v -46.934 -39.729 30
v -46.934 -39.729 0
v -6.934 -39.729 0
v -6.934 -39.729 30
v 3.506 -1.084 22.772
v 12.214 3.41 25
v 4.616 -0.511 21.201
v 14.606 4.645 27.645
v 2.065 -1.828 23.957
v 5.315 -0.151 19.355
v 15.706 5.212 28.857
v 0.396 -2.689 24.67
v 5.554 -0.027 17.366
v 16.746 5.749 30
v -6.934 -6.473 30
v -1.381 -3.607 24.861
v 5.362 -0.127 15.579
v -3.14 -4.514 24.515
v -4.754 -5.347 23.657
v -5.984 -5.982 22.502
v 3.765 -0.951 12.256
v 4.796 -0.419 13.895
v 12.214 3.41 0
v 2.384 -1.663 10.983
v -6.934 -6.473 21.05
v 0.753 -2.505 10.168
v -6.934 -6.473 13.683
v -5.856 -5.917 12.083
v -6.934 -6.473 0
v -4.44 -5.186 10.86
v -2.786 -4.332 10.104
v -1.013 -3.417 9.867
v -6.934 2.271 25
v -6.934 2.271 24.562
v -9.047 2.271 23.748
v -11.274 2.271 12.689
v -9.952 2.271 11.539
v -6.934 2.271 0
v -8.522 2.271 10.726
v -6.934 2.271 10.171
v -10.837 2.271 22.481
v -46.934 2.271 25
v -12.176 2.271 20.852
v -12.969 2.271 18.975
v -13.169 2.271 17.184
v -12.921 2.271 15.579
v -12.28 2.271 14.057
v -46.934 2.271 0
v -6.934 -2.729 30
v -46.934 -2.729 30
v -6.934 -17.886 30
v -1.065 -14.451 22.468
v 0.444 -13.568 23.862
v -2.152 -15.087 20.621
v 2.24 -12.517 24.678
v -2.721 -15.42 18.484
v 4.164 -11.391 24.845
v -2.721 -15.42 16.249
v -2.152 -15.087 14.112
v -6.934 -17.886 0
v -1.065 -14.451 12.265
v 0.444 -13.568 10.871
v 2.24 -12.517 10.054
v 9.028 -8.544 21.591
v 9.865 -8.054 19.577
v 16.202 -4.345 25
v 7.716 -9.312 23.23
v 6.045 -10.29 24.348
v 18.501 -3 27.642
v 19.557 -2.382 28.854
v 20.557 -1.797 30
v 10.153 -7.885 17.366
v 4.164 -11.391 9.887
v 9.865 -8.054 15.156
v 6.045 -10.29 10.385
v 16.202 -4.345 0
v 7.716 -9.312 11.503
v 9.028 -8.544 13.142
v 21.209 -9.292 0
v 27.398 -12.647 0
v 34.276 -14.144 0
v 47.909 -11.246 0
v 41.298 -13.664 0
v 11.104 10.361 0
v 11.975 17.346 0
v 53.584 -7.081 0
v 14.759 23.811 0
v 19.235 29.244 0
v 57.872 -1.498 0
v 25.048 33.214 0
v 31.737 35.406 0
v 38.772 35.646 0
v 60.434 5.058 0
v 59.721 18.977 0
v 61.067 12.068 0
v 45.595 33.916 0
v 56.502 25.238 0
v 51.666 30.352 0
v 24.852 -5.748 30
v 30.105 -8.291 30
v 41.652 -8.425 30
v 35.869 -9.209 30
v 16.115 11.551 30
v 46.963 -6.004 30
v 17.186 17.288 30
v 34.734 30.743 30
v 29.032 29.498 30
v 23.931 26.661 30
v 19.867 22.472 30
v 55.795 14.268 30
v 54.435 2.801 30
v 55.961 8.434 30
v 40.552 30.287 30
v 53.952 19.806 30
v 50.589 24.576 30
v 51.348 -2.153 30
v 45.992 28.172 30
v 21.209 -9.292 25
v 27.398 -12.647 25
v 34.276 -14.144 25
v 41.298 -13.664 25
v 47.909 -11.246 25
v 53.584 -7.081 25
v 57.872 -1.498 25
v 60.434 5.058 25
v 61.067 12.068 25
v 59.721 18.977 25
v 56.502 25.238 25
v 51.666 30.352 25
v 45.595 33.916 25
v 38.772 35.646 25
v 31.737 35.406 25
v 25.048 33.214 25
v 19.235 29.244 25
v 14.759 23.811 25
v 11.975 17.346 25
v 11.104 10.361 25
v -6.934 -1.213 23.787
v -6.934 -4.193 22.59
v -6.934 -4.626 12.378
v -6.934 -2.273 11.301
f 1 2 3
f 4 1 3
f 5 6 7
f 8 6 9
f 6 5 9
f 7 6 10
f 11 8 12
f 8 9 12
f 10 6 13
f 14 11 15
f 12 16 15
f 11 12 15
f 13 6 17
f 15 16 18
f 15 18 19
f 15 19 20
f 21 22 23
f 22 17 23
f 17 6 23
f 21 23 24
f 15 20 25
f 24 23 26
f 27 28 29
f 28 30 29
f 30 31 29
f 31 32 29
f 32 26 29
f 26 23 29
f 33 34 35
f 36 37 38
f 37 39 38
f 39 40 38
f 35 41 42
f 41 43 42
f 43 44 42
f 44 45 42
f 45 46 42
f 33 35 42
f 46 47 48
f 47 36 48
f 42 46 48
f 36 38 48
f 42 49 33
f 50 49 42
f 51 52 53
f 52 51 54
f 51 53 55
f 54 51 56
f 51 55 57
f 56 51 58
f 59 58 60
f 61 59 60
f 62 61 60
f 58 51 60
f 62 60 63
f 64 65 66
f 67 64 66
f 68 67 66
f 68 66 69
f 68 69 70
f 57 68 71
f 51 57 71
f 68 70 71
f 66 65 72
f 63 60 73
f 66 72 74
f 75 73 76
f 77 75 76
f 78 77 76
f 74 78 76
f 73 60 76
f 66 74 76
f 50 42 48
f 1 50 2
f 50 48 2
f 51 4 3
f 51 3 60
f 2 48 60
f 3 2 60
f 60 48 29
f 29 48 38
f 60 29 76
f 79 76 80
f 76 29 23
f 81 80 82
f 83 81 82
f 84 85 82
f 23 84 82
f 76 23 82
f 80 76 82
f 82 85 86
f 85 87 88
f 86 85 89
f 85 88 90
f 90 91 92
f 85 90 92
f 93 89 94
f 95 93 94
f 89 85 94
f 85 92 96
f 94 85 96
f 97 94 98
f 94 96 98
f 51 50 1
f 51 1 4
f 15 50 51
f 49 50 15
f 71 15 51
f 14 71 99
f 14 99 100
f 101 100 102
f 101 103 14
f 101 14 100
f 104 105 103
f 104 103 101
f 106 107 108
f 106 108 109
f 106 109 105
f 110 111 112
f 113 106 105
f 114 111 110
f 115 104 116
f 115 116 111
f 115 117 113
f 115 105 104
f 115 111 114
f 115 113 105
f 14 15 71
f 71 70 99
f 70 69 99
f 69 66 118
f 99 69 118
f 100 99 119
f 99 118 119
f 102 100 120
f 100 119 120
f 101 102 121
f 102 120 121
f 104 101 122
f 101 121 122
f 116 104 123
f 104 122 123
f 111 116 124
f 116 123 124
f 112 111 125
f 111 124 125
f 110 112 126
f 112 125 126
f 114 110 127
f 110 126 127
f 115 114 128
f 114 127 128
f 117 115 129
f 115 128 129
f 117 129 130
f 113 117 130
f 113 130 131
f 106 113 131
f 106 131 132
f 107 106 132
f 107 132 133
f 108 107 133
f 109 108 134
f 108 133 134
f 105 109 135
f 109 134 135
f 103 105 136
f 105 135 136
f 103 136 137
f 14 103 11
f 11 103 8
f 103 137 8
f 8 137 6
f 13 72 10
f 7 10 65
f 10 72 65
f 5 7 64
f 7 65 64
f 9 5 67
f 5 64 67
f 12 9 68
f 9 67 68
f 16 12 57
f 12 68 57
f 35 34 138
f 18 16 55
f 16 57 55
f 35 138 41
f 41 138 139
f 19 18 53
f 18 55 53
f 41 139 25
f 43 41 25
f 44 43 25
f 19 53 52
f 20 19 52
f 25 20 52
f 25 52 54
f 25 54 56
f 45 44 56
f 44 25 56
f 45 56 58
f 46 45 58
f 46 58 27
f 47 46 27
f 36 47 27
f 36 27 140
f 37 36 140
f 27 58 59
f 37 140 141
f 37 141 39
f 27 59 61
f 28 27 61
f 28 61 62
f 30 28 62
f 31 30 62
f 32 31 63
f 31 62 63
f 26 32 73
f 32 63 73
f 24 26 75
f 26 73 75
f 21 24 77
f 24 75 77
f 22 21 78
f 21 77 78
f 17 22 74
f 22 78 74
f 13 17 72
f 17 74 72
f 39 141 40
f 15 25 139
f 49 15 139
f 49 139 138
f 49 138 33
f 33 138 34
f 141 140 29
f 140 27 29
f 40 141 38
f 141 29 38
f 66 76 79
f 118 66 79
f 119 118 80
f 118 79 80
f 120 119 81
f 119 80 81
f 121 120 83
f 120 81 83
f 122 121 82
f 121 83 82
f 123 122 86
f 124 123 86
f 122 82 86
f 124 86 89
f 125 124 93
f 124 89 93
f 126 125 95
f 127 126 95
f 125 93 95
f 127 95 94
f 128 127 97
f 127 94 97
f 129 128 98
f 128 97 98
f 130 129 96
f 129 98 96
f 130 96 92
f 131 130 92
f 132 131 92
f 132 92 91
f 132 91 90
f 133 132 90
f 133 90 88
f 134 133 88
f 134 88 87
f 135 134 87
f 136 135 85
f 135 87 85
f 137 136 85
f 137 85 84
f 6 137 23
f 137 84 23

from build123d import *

# Parameters (mm, degrees)
F1_DEPTH = 30
F2_R     = 7.5
F3_DEPTH = 66.5296831478
F4_SIZE  = 5


with BuildPart() as f1:
    # F0 (on Top) → F1 (new body)
    with BuildSketch(Plane.XY):
        with BuildLine():
            Line((-6.9337203167, 2.2713398635), (-46.9337203167, 2.2713398635))
            Line((-46.9337203167, 2.2713398635), (-46.9337203167, -39.7286601365))
            Line((-46.9337203167, -39.7286601365), (-6.9337203167, -39.7286601365))
            Line((-6.9337203167, -39.7286601365), (-6.9337203167, -17.885550487))
            Line((-6.9337203167, -17.885550487), (16.2017301439, -4.3453868678))
            ThreePointArc((16.2017301439, -4.3453868678), (58.3330589287, 22.2213546523), (12.2138993907, 3.4100882496))
            Line((12.2138993907, 3.4100882496), (-6.9337203167, -6.4725532874))
            Line((-6.9337203167, -6.4725532874), (-6.9337203167, 2.2713398635))
        make_face()
    extrude(amount=F1_DEPTH)

    # F2 (on face) → F3 (cut, through all)
    with BuildSketch(Plane(origin=(6.027939026, -10.2996602284, 0), x_dir=(0.8630557619, 0.5051086534, 0), z_dir=(0.5051086534, -0.8630557619, 0))):
        with Locations((-2.7203583159, 17.3664018512)):
            Circle(F2_R)
    extrude(amount=-F3_DEPTH, mode=Mode.SUBTRACT)

    # F4
    f4_edges = [f1.edges().sort_by_distance(p)[0] for p in [
        (58.333059, 22.221355, 30),
        (-26.93372, 2.27134, 30),
    ]]
    chamfer(f4_edges, length=F4_SIZE)


solid = f1.part
